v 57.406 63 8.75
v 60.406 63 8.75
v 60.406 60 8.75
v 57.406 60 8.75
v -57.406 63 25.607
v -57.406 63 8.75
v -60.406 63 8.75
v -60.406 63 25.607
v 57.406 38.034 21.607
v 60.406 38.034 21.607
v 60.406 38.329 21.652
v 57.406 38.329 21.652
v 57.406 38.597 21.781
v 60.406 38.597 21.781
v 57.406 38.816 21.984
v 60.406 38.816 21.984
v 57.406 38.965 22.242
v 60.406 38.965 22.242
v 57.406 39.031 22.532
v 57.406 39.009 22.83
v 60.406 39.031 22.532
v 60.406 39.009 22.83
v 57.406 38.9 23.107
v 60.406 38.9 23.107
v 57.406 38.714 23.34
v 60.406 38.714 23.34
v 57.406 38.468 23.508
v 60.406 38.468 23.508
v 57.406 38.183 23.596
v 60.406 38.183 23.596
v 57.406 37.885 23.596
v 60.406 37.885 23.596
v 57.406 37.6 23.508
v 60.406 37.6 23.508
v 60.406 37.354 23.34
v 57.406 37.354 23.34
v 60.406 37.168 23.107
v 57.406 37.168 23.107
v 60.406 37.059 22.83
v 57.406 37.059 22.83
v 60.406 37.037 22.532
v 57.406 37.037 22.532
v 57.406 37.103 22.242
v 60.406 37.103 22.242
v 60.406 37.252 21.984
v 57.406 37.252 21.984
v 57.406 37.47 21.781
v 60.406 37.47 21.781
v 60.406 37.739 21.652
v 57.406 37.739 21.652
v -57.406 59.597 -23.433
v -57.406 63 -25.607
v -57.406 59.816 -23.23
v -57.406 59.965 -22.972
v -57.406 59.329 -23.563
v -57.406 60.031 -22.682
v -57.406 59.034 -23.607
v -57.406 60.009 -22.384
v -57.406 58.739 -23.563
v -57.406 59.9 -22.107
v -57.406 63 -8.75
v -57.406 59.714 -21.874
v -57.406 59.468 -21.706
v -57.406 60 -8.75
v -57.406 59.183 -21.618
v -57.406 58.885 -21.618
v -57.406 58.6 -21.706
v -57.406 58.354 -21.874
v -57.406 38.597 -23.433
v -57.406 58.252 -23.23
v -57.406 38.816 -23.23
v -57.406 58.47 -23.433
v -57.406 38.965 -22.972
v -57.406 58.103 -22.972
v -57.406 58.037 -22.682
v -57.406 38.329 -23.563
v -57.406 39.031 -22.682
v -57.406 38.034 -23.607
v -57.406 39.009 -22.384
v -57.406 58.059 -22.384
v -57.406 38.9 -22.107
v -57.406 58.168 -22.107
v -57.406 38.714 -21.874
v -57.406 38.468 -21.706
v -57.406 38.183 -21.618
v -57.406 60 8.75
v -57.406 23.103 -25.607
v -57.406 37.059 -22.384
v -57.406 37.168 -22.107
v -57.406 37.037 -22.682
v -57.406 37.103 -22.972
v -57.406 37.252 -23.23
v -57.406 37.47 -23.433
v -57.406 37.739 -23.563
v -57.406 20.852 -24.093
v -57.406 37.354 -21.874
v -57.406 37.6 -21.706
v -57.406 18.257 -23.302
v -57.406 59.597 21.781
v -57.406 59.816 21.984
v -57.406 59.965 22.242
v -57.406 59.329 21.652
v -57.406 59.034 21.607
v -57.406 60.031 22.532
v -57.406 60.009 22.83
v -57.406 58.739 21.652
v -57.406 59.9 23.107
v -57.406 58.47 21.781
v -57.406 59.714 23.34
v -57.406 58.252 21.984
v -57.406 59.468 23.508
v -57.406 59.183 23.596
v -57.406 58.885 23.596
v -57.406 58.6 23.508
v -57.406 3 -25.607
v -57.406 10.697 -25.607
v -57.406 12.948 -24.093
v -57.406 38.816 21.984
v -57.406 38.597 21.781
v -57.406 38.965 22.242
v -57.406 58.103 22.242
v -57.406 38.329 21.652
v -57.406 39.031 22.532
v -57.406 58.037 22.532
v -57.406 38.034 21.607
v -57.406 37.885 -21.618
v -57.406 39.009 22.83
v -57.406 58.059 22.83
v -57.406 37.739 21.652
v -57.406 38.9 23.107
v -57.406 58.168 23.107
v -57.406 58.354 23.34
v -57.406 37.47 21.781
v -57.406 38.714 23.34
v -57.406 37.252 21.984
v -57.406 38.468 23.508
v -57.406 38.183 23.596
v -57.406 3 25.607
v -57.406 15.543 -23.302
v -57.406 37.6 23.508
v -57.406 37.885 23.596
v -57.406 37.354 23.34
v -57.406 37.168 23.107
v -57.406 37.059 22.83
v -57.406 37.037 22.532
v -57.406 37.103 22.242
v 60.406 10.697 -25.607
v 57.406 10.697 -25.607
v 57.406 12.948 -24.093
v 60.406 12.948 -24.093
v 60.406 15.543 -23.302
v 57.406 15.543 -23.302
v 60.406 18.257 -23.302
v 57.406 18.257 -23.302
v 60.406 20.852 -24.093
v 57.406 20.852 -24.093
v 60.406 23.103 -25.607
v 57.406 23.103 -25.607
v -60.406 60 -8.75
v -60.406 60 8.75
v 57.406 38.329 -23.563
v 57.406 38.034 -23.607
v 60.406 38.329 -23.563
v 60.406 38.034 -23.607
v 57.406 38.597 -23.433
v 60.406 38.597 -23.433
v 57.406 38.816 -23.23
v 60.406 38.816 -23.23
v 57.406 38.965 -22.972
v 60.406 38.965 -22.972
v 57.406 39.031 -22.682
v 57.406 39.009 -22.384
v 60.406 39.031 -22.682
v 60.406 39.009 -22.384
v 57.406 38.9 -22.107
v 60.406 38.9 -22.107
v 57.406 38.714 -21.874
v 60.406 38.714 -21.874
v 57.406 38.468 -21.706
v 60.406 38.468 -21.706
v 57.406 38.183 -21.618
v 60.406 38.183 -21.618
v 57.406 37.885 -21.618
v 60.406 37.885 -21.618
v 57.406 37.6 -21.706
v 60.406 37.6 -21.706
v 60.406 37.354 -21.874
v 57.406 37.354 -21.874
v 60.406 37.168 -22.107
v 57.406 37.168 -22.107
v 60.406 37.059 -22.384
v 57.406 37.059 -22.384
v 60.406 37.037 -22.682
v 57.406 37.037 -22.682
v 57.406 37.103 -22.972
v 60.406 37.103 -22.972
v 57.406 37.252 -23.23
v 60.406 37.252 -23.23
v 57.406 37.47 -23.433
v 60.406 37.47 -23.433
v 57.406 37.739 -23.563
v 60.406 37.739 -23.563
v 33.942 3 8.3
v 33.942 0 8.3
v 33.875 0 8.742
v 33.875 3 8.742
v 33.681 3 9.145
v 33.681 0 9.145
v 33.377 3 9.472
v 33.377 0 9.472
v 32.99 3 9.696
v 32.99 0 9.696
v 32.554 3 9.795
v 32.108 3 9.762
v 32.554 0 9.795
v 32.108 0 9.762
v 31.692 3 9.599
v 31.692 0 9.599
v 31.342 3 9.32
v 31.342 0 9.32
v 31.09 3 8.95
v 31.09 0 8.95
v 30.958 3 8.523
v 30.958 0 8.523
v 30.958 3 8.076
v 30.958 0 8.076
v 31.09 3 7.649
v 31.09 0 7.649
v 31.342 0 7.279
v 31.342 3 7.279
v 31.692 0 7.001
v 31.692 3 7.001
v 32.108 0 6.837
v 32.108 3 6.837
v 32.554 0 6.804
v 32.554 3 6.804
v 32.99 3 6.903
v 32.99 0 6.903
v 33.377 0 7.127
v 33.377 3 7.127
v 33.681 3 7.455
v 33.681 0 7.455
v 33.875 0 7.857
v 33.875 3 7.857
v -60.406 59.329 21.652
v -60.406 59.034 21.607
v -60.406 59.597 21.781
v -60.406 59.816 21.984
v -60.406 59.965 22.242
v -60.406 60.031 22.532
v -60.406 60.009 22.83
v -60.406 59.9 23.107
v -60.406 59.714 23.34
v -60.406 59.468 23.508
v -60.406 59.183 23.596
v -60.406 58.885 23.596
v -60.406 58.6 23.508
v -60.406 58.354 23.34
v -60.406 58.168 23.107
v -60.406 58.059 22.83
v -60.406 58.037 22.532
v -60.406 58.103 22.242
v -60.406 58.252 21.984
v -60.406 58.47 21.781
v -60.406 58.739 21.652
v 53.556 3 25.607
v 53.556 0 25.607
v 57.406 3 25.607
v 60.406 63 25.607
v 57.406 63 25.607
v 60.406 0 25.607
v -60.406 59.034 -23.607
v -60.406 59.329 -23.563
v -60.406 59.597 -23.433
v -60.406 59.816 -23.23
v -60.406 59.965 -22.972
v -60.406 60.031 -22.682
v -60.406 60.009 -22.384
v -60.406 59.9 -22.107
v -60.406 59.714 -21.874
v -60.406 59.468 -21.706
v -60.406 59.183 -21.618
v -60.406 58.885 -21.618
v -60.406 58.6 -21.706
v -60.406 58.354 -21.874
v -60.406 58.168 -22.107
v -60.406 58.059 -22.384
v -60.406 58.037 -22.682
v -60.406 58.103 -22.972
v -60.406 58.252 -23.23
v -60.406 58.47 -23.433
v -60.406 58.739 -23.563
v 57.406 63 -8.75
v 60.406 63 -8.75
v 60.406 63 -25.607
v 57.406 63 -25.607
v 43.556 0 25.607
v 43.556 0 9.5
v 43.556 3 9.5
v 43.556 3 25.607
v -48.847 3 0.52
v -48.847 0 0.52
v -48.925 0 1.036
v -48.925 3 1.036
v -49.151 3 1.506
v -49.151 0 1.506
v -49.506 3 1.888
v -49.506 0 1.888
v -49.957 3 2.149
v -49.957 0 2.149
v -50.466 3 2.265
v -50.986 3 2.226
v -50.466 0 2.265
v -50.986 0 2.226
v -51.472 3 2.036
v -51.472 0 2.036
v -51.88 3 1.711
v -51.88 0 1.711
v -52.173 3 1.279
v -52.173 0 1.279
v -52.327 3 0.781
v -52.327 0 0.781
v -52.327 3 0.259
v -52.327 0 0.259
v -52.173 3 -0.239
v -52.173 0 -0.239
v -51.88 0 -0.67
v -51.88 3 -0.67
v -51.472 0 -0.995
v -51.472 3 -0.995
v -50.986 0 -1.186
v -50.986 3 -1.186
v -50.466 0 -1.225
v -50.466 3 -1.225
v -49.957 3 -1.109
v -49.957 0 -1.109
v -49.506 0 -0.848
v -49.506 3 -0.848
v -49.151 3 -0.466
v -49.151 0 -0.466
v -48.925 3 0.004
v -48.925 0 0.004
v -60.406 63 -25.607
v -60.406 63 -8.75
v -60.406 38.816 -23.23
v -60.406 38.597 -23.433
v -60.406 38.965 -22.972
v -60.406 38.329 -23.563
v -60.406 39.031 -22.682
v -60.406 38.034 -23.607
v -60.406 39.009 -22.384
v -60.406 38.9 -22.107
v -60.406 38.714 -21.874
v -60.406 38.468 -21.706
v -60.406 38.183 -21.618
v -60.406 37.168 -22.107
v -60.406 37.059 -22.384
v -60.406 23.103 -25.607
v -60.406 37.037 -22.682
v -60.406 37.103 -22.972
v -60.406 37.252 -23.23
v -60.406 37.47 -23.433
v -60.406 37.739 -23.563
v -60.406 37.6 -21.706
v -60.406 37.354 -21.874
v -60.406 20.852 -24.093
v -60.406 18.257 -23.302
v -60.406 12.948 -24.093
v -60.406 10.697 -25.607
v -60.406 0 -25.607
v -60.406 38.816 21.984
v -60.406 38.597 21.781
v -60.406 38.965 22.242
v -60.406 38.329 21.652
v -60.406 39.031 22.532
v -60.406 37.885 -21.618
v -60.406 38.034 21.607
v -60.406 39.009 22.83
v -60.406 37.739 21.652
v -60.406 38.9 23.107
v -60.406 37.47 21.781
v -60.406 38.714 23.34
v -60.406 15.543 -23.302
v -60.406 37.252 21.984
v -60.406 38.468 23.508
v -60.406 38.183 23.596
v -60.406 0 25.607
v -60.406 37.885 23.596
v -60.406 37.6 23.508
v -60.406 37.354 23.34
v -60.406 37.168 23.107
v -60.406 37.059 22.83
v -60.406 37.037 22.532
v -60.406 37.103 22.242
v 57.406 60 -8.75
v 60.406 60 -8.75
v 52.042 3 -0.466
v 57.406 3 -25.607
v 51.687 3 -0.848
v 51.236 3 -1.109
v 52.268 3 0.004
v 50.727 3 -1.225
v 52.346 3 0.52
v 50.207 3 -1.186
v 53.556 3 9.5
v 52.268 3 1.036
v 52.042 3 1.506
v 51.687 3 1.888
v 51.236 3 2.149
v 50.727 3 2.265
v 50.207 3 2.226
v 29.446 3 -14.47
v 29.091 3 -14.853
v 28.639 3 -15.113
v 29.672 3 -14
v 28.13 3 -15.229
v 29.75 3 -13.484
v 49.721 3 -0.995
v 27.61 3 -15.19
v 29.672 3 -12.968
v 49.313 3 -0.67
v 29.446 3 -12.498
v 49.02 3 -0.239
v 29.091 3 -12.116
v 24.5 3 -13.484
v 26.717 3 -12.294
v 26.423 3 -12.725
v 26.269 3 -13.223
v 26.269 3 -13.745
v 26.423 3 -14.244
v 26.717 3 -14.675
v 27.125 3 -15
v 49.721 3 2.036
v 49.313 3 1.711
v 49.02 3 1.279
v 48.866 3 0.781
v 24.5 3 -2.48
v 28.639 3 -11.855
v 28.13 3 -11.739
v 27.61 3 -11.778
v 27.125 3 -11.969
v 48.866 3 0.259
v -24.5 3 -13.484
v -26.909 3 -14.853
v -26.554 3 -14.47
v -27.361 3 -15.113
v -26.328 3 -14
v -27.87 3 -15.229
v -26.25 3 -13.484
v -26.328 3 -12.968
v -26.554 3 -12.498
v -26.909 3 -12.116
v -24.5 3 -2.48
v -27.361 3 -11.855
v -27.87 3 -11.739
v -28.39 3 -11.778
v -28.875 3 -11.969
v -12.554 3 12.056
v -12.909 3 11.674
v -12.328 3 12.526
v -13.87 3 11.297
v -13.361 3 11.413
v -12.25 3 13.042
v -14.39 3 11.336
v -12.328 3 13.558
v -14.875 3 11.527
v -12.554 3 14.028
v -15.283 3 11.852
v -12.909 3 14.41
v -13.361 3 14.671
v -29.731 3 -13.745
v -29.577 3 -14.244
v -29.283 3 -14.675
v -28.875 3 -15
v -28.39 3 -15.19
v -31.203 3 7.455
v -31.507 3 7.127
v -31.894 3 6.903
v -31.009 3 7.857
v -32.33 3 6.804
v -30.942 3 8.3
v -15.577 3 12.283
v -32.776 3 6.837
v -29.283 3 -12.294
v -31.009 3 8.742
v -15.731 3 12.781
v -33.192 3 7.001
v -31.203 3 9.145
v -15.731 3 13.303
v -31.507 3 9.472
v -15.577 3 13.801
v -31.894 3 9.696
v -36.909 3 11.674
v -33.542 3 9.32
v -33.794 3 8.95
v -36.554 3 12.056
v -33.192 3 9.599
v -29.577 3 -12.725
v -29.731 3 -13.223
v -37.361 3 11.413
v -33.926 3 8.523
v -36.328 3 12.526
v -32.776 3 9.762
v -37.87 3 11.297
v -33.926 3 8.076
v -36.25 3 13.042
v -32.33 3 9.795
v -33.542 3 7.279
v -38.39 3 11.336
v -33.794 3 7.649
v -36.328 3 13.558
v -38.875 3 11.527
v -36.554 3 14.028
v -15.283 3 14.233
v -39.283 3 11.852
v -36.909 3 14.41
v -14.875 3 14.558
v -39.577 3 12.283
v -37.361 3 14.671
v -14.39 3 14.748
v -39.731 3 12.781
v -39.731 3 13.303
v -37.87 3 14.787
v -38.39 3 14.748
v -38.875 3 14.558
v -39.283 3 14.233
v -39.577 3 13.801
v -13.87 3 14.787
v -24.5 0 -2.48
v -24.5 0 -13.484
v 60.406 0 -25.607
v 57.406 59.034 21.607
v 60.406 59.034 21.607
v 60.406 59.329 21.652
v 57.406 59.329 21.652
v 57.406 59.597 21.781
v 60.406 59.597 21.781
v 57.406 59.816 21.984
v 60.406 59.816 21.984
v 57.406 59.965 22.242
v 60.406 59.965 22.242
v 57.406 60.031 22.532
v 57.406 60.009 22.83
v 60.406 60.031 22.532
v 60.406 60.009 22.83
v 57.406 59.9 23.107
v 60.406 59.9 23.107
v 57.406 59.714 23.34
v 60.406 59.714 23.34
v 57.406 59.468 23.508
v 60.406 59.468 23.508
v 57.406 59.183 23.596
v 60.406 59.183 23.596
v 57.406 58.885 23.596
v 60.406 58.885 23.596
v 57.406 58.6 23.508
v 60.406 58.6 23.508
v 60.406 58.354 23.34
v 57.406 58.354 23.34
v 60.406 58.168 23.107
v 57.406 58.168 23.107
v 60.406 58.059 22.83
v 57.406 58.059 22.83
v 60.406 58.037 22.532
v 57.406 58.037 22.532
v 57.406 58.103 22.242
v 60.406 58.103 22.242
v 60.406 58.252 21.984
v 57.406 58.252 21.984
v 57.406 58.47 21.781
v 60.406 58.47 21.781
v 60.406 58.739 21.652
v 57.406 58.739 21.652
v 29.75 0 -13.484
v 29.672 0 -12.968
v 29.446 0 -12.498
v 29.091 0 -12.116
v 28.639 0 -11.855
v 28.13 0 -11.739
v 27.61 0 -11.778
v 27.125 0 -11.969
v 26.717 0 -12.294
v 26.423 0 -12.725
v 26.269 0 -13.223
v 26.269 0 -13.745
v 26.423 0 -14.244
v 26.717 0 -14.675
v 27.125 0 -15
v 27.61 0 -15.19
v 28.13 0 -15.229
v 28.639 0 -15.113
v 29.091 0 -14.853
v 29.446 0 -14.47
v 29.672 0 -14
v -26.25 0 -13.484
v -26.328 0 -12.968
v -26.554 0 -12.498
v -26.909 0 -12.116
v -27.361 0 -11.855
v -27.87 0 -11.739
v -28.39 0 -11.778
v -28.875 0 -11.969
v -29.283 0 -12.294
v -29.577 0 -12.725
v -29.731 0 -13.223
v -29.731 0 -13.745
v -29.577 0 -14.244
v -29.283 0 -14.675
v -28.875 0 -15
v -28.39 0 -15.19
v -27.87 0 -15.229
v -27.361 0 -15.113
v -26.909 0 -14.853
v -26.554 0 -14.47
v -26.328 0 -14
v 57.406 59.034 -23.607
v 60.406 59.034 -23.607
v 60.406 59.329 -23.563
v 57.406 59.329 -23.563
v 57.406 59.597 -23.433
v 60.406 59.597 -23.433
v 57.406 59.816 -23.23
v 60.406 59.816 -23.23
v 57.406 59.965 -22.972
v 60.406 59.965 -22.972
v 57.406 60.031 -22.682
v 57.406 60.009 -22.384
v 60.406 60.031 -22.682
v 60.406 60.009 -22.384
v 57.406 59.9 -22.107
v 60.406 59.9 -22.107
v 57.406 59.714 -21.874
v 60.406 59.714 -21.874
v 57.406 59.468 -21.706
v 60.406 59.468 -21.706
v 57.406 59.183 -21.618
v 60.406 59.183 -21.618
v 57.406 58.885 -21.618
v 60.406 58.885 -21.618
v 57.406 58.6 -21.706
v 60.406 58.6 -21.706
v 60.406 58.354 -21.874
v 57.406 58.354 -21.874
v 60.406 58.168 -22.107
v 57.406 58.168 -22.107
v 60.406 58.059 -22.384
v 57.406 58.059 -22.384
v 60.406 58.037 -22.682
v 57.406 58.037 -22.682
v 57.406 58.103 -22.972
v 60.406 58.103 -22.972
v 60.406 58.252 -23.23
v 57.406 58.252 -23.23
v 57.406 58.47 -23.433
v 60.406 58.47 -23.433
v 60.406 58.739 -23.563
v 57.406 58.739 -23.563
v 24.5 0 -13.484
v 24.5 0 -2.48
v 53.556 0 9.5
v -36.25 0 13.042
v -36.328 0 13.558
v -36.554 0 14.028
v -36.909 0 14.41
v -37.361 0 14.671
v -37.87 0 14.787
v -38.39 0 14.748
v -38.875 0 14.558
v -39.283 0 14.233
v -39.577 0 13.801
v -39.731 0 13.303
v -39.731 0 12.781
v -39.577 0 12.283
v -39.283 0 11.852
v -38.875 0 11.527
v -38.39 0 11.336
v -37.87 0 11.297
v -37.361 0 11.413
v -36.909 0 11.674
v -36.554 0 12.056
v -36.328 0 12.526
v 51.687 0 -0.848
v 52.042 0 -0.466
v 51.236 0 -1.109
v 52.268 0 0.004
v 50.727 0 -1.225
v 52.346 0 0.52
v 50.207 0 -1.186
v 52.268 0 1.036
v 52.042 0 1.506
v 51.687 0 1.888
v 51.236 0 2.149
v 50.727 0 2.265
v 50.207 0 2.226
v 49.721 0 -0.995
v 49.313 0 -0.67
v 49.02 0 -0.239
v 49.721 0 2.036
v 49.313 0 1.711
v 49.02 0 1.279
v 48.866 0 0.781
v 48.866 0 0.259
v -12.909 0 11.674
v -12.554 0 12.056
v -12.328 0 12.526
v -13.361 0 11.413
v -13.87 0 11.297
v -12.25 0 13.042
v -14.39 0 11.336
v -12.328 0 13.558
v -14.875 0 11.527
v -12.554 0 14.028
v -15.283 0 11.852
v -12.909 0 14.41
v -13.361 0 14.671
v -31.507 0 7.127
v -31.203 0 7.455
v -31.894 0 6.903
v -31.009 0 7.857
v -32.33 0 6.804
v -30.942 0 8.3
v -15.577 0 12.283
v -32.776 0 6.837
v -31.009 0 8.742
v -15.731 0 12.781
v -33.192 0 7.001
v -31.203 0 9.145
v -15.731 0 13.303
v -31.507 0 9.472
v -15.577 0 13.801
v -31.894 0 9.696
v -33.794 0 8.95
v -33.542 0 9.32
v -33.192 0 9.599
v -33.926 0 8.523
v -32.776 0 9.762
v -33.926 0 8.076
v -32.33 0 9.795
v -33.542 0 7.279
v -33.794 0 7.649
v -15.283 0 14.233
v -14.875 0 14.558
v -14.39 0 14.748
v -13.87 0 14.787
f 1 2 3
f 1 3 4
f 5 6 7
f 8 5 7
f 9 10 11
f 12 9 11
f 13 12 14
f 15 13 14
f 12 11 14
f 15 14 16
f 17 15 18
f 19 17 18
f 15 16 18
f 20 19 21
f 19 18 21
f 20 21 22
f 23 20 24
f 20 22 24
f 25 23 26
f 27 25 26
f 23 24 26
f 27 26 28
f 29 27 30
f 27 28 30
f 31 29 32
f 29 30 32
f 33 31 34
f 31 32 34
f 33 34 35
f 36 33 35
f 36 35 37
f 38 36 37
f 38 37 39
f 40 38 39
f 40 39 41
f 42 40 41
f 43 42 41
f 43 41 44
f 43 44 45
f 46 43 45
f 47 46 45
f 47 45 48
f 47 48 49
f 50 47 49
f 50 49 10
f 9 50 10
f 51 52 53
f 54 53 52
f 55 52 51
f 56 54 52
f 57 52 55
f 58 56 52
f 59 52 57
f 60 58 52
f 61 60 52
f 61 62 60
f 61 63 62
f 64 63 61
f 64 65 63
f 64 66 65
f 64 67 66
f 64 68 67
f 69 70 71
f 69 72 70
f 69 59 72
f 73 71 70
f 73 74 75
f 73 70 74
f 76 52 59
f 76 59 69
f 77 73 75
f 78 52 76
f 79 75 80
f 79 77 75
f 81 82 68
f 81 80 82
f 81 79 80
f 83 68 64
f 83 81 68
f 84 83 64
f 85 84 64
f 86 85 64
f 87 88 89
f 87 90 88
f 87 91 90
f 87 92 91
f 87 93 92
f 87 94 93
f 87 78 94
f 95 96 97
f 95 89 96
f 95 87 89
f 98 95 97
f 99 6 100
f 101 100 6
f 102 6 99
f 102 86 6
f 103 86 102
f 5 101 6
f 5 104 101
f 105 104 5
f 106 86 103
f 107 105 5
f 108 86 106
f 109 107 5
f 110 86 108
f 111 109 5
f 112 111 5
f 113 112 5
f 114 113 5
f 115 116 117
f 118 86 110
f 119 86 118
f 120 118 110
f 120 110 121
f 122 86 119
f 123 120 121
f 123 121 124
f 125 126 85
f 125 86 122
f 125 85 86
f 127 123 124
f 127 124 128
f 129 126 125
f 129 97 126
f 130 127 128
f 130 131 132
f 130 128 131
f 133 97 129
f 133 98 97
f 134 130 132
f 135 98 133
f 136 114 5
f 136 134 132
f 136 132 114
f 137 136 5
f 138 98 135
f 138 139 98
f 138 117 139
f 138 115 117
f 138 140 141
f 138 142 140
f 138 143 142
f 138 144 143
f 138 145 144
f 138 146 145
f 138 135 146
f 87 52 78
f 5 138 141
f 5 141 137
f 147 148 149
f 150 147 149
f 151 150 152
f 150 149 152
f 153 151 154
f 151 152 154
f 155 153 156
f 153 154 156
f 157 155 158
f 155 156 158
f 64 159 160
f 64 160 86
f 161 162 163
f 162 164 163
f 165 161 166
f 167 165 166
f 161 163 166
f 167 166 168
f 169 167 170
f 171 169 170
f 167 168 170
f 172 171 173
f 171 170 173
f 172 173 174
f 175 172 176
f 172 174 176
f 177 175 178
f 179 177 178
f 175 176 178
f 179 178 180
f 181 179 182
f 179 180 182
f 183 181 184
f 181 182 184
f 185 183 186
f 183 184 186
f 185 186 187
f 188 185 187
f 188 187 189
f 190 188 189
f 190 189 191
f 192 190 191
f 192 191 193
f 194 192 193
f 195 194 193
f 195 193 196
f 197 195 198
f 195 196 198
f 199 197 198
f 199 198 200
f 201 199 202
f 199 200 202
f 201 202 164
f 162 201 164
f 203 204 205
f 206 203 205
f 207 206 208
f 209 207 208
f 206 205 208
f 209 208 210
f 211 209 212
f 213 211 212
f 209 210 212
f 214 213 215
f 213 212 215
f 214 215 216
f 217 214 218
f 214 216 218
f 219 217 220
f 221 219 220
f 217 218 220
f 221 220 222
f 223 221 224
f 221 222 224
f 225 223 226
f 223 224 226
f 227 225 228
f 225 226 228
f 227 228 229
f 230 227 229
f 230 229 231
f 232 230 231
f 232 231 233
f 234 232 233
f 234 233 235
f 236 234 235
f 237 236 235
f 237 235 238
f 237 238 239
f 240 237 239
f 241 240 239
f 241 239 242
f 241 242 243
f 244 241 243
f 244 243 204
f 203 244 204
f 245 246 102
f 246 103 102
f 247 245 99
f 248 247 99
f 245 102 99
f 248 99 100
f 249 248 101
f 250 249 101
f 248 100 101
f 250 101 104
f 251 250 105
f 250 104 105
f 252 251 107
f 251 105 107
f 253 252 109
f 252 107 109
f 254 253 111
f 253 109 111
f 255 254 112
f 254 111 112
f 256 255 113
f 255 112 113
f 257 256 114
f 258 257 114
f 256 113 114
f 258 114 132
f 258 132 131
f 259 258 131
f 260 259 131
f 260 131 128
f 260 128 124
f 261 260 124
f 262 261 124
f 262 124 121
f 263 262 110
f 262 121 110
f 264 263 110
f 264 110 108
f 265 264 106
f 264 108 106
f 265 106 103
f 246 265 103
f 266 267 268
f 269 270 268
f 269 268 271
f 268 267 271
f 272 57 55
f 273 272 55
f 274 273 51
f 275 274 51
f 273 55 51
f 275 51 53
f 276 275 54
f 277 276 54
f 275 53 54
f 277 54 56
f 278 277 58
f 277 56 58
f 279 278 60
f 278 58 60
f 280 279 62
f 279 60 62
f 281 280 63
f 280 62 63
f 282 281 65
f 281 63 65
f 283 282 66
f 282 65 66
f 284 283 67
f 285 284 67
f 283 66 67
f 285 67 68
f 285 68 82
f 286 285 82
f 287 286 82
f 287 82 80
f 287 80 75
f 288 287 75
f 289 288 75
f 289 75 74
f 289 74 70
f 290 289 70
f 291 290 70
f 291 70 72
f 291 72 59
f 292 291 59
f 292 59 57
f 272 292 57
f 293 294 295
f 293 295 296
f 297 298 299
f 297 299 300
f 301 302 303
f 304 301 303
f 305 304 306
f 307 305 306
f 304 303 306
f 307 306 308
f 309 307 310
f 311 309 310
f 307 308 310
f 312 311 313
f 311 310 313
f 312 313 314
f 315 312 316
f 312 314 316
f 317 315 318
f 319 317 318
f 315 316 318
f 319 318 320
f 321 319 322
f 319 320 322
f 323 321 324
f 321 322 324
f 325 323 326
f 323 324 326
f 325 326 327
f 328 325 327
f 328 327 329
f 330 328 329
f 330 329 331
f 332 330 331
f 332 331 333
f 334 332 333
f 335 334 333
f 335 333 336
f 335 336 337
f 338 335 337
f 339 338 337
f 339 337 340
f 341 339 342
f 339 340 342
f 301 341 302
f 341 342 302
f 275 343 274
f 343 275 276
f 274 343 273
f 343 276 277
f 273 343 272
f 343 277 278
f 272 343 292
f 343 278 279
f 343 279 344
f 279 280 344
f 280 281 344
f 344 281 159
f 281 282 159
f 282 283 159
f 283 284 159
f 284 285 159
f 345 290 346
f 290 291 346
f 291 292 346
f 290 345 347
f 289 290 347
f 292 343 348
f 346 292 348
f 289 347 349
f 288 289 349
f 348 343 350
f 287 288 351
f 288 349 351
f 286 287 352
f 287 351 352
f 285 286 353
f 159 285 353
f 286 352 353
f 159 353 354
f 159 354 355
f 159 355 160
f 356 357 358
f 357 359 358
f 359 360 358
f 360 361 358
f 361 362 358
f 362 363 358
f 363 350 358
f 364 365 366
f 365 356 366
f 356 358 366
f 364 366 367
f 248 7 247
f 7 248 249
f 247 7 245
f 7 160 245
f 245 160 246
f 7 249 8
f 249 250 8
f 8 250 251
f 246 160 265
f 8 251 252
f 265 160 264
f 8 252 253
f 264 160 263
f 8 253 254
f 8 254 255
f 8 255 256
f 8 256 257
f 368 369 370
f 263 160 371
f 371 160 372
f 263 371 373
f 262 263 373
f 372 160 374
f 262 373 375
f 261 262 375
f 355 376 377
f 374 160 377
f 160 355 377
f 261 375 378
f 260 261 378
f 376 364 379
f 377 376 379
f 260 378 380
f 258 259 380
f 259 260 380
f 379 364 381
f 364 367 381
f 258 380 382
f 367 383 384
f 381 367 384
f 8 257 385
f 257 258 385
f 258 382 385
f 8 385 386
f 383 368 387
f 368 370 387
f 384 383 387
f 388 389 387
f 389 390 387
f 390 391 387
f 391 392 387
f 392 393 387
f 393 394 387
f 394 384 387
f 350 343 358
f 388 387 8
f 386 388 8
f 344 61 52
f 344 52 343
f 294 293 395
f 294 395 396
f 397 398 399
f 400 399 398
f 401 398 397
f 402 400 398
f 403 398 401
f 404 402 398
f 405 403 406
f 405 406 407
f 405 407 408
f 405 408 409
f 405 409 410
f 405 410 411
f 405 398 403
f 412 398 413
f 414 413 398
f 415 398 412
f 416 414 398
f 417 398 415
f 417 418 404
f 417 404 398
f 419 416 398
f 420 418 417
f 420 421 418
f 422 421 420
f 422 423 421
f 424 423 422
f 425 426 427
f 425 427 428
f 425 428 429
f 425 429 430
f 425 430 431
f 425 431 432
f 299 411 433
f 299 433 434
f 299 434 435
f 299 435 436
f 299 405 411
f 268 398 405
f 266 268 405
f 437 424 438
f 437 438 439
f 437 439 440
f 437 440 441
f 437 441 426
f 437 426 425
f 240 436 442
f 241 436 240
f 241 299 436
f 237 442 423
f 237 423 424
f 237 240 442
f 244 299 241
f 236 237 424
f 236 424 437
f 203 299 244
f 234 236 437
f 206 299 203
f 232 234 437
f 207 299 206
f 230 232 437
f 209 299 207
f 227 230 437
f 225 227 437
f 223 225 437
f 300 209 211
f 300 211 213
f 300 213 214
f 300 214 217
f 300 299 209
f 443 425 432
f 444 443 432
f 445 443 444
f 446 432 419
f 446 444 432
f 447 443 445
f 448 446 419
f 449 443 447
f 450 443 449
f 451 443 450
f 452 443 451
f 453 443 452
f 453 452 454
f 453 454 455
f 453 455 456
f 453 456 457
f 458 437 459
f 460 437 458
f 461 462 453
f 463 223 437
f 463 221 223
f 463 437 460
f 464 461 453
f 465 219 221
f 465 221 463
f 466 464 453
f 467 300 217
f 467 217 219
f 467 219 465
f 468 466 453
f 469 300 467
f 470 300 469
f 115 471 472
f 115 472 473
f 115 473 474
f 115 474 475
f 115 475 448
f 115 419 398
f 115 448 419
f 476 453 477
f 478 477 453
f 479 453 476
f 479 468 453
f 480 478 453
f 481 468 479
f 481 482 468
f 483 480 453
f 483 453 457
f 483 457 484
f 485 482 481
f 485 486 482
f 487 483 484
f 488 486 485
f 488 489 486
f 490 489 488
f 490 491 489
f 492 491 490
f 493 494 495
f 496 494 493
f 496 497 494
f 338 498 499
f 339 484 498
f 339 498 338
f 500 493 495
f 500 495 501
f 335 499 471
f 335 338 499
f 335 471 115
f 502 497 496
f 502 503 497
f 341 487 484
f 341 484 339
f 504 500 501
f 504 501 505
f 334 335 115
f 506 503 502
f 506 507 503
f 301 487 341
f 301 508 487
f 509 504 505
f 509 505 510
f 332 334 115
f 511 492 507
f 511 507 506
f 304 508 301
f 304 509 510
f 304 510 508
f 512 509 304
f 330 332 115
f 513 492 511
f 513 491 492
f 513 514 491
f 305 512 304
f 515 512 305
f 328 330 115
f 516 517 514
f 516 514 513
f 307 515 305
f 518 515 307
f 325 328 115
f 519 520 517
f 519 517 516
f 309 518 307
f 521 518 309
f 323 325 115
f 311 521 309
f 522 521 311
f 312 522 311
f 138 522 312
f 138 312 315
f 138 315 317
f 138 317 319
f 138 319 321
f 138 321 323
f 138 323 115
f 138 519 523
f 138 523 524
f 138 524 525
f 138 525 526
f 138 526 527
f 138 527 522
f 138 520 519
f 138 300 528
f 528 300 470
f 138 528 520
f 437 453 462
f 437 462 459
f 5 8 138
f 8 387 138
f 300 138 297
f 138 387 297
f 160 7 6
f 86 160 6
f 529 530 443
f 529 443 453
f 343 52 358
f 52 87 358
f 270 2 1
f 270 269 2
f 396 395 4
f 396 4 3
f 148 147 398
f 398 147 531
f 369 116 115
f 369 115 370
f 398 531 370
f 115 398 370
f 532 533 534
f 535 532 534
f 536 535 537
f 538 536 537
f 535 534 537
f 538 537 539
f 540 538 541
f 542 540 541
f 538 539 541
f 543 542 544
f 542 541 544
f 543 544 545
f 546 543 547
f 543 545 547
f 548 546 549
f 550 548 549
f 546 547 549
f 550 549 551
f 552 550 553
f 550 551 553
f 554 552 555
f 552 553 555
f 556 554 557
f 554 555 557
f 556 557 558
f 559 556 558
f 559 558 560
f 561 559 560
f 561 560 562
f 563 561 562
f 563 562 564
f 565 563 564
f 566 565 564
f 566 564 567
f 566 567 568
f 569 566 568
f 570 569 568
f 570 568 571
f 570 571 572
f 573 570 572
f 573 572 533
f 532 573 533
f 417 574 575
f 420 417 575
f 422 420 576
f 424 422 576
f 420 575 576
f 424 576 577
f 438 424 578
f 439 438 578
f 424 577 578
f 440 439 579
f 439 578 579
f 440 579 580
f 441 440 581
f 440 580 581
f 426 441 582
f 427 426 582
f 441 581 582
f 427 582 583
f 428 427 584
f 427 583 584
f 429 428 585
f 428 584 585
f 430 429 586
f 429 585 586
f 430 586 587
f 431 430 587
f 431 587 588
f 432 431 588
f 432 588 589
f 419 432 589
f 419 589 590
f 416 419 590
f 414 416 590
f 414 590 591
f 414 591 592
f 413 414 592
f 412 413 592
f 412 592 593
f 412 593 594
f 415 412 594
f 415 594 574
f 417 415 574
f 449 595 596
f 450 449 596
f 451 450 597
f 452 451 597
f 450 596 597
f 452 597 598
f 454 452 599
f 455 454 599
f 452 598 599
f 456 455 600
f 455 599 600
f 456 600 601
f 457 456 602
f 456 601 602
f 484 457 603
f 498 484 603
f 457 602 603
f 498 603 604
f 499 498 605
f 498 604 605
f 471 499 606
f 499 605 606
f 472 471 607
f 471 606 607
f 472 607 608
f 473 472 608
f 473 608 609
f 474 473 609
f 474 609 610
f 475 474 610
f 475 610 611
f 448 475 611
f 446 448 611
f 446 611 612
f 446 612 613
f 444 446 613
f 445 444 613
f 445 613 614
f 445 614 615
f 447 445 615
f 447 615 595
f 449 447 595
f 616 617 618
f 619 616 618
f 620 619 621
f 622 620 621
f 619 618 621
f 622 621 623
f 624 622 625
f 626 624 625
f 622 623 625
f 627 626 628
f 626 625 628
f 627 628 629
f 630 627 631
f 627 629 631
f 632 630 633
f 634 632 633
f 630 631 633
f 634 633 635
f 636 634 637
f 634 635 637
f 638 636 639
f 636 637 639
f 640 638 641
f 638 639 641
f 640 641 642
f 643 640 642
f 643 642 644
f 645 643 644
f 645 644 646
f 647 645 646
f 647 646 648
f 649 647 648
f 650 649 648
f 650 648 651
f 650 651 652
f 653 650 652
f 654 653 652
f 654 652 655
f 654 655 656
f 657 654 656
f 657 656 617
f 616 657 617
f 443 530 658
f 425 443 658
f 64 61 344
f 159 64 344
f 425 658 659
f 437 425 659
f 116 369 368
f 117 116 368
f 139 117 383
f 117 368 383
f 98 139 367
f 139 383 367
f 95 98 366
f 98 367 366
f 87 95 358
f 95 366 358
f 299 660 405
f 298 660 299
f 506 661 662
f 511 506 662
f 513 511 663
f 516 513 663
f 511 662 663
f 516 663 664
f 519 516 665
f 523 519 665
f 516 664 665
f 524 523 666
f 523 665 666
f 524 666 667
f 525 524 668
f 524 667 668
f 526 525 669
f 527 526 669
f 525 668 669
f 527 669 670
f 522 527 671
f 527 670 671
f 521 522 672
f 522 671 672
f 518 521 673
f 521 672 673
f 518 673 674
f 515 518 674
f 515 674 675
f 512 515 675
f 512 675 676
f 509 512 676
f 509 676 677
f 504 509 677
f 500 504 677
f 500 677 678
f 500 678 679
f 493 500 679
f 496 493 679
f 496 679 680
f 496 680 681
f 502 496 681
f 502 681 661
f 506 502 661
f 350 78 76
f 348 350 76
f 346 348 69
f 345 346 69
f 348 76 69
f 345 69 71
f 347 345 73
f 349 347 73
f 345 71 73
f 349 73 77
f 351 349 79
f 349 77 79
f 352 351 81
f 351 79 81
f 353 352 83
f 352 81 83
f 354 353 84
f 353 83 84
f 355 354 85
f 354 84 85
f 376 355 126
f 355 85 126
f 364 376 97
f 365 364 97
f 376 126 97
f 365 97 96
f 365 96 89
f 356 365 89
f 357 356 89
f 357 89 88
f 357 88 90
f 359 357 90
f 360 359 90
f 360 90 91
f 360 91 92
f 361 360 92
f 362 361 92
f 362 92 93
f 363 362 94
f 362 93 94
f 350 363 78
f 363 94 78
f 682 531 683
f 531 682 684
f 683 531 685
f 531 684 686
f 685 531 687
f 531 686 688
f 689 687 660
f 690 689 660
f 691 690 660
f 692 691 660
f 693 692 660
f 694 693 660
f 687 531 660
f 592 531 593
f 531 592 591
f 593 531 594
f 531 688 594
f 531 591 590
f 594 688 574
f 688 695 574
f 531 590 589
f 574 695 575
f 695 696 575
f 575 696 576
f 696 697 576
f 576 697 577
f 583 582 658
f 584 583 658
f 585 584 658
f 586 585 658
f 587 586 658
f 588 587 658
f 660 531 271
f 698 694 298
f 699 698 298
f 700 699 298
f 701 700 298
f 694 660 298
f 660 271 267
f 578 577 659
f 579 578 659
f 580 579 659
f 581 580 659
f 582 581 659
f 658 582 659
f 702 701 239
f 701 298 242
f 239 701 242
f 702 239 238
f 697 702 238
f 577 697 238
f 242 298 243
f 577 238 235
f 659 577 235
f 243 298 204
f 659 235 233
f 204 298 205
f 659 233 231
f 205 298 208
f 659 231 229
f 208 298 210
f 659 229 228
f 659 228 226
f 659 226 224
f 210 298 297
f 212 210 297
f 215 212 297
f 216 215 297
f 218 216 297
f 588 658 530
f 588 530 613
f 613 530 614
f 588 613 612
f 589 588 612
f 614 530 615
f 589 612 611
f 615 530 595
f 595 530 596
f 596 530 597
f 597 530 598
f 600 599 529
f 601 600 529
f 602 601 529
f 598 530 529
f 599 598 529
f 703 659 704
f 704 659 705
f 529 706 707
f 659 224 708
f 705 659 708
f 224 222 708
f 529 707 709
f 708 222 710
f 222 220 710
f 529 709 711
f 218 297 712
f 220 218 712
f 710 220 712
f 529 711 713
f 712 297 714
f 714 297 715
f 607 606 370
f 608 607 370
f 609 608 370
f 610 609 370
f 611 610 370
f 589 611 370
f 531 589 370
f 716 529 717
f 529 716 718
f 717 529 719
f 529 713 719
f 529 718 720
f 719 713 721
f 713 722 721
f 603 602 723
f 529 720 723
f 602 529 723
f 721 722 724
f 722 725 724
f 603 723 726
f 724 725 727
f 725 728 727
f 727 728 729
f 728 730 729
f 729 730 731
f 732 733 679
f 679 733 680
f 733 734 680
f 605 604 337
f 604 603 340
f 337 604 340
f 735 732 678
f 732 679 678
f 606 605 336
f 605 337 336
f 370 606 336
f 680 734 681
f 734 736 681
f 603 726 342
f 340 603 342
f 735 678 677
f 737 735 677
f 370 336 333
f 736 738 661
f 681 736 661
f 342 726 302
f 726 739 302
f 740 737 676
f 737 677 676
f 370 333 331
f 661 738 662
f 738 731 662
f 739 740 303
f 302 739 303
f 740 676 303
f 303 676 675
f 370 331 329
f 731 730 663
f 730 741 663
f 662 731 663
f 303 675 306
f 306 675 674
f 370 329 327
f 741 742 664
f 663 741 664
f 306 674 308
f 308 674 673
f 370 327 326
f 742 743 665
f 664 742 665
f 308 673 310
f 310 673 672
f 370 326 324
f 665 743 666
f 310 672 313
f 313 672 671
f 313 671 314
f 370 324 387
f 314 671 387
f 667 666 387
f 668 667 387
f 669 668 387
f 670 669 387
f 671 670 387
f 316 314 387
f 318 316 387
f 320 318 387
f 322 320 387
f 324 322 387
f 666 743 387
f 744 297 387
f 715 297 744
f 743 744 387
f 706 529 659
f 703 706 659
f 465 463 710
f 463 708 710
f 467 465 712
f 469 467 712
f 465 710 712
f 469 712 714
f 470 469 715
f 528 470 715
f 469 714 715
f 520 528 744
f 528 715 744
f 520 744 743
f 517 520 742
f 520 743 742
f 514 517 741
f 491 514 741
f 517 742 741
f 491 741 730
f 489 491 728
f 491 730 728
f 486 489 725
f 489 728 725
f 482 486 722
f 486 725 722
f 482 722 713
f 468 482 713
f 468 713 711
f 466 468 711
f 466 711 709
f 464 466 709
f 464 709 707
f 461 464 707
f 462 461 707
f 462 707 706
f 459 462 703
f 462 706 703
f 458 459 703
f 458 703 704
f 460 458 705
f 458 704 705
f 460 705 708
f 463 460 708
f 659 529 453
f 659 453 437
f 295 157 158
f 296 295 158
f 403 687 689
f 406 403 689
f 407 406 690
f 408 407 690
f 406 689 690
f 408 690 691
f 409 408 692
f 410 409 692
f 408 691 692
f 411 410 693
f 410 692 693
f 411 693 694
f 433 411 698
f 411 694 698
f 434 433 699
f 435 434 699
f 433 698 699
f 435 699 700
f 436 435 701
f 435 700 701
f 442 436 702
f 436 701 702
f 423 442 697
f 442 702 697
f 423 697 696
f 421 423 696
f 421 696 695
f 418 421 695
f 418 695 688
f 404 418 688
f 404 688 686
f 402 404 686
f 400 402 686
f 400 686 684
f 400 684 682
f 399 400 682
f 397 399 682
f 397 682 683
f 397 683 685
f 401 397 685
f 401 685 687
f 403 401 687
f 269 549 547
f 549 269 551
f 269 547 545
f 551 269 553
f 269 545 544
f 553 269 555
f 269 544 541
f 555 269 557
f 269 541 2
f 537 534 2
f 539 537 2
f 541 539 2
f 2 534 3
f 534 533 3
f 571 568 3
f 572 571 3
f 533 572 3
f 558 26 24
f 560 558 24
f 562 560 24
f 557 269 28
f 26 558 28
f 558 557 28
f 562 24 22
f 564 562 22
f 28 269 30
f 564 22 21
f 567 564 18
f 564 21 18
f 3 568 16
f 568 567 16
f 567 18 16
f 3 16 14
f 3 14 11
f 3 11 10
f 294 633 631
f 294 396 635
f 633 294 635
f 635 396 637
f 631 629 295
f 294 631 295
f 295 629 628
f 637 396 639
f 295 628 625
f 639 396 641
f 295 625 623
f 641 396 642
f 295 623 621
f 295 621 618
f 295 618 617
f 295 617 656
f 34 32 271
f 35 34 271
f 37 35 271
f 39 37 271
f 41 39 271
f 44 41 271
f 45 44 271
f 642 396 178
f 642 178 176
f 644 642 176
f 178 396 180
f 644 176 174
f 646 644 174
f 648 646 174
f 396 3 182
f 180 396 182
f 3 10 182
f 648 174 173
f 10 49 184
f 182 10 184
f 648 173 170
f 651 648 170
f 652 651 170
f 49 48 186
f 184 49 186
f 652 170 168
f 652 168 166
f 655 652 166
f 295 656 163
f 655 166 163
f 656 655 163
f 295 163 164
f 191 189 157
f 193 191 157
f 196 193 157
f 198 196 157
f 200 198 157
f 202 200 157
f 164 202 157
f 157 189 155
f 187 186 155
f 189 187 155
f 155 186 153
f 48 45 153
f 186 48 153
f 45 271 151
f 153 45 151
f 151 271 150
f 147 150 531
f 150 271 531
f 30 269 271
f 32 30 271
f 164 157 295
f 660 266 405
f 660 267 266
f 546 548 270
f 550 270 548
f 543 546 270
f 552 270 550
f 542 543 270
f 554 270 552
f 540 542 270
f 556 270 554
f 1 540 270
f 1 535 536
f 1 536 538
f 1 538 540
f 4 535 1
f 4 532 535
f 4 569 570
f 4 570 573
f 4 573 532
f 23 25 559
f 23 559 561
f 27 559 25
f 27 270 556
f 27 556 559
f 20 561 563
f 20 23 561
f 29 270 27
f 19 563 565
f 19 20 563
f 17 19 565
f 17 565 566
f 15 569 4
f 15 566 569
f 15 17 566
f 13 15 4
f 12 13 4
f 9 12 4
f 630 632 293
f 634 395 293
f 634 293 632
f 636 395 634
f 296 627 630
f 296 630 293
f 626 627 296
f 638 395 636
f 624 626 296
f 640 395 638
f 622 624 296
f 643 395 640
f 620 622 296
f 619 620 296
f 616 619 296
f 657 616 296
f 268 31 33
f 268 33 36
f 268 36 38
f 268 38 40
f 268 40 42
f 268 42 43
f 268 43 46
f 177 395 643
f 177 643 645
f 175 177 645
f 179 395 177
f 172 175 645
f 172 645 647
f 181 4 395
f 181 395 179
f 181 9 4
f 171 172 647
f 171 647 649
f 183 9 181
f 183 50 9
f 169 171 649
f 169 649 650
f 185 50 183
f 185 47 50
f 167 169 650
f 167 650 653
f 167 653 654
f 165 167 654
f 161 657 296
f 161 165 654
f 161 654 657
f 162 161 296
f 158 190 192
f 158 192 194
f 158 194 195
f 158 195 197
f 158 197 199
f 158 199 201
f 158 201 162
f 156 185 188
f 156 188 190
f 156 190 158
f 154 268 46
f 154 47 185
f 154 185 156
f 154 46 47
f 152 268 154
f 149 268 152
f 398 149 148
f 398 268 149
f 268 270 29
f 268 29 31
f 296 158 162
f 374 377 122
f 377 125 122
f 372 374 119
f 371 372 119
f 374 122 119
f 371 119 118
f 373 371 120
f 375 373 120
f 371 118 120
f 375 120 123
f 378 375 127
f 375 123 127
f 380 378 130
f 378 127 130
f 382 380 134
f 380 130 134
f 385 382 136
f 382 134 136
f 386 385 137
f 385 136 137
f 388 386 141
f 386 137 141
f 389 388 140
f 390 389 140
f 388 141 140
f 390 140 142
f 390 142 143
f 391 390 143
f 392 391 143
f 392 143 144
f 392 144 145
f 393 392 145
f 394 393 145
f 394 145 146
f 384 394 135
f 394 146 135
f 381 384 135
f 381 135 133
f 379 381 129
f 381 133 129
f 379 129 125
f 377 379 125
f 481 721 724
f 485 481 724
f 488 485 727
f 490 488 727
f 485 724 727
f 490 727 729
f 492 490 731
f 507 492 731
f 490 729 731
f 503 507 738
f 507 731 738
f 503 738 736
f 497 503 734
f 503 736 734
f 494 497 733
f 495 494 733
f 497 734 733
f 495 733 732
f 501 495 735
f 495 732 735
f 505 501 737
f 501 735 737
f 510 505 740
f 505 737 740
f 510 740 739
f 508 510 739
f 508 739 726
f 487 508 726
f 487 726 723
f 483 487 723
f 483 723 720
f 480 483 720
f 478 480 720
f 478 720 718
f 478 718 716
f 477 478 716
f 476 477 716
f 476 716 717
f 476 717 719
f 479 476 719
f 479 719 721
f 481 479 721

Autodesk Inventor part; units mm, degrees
ref_plane "YZ Plane" through (0, 0, 0) normal (1, 0, 0) x (0, 1, 0)
ref_plane "XZ Plane" through (0, 0, 0) normal (0, 1, 0) x (-1, 0, 0)
sketch "Sketch1" plane through (0, 0, 0) normal (0, 1, 0) x (-1, 0, 0)
  line L0 (60.406, 25.6071) -> (-60.406, 25.6071)
  line L1 (-60.406, 25.6071) -> (-60.406, -25.6071)
  line L2 (-60.406, -25.6071) -> (60.406, -25.6071)
  line L3 (60.406, -25.6071) -> (60.406, 25.6071)
  line L4 (60.406, 25.6071) -> (-60.406, -25.6071) construction
  line L5 (-60.406, 25.6071) -> (60.406, -25.6071) construction
  line L6 (-57.406, 25.6071) -> (-57.406, -25.6071)
  line L7 (57.406, -25.6071) -> (57.406, 25.6071)
  line L8 (57.406, 23.5058) -> (55.4493, 23.5058)
  line L9 (-55.4493, 23.5058) -> (-57.406, 23.5058)
  line L10 (-57.406, -33.4947) -> (-79.0126, -33.4947)
  line L11 (79.0126, -33.4947) -> (57.406, -33.4947)
  point P0 (0, 0)
  dimension "d0" = 120.812
  dimension "d1" = 51.2141
  dimension "d8" = 3
  dimension "d9" = 3
  dimension "d10" = 114.812
extrude "Extrusion1" add sketch "Sketch1" along normal blind 3
extrude "Extrusion2" add sketch "Sketch1" along normal blind 63 contours L3 L2 L7 L0 | L6 L2 L1 L0
ref_plane "Work Plane2" through (0, 0, -18.4174) normal (0, 0, 1) x (1, 0, 0)
sketch "Sketch2" plane through (0, 0, 0) normal (0, -1, 0) x (1, 0, 0)
  circle A0 centre (-50.5968, 0.5202) radius 1.75 projected
  circle A1 centre (-28.0003, -13.4843) radius 1.75 projected
  circle A2 centre (50.5962, 0.5202) radius 1.75 projected
  circle A3 centre (27.9997, -13.4843) radius 1.75 projected
  circle A4 centre (27.9997, -13.4843) radius 1.75
  circle A5 centre (50.5962, 0.5202) radius 1.75
  circle A6 centre (-28.0003, -13.4843) radius 1.75
  circle A7 centre (-50.5968, 0.5202) radius 1.75
  point P0 (0, 0)
  dimension "d12" = 3.5
  dimension "d13" = 3.5
  dimension "d14" = 3.5
  dimension "d15" = 3.5
extrude "Extrusion3" cut sketch "Sketch2" against normal up to next
sketch "Sketch4" plane through (0, 63, 0) normal (0, 1, 0) x (1, 0, 0)
  line L0 (-60.406, -8.75) -> (-56.906, -8.75)
  line L1 (-56.906, -8.75) -> (-56.906, 8.75)
  line L2 (-56.906, 8.75) -> (-60.406, 8.75)
  line L3 (-60.406, -8.75) -> (-60.406, 8.75)
  line L4 (0, 0) -> (0, 8.75)
  line L5 (60.406, -8.75) -> (56.906, -8.75)
  line L6 (56.906, -8.75) -> (56.906, 8.75)
  line L7 (56.906, 8.75) -> (60.406, 8.75)
  line L8 (60.406, -8.75) -> (60.406, 8.75)
  point P0 (-60.406, 0)
  point P1 (60.406, 0)
  dimension "d18" = 17.5
extrude "Extrusion4" cut sketch "Sketch4" against normal blind 3
sketch "Sketch6" plane through (0, 0, 0) normal (0, -1, 0) x (1, 0, 0)
  circle A0 centre (-32.4423, 8.2996) radius 1.5 projected
  circle A1 centre (32.4417, 8.2996) radius 1.5 projected
  point P0 (0, 0)
extrude "Extrusion5" cut sketch "Sketch6" against normal up to next
sketch "Sketch9" plane through (60.406, 0, 25.6071) normal (1, 0, 0) x (0, 0, -1)
  circle A0 centre (3, 59.0338) radius 1 projected
  circle A1 centre (3, 38.0338) radius 1 projected
  circle A2 centre (48.2141, 59.0338) radius 1 projected
  circle A3 centre (48.2141, 38.0338) radius 1 projected
  point P0 (25.6071, 0)
extrude "Extrusion7" cut sketch "Sketch9" against normal blind 200
sketch "Sketch10" plane through (0, 0, 0) normal (0, -1, 0) x (1, 0, 0)
  circle A0 centre (-28.0003, -13.4843) radius 1.75 projected
  circle A1 centre (27.9997, -13.4843) radius 1.75 projected
  line L0 (53.5962, 73.5112) -> (-53.5968, 73.5112)
  line L1 (-24.5003, -13.4843) -> (24.4997, -13.4843)
  line L2 (24.4997, 73.5112) -> (-24.5003, 73.5112)
  line L3 (-24.5003, -13.4843) -> (-24.5003, -2.4798)
  line L4 (-24.5003, -13.4843) -> (-13.4958, -13.4843) construction
  line L5 (-24.5003, -2.4798) -> (24.4997, -2.4798)
  line L6 (24.4997, -13.4843) -> (24.4997, -2.4798)
  point P0 (0, 0)
  dimension "d39" = 90
extrude "Extrusion8" cut sketch "Sketch10" against normal up to next contours L3 L5 L6 L1
sketch "Sketch11" plane through (0, 0, 0) normal (0, -1, 0) x (1, 0, 0)
  circle A0 centre (-38.0003, 13.0422) radius 1.75
  circle A1 centre (-14.0003, 13.0422) radius 1.75
  line L0 (-36.0003, -4.4688) -> (-36.0003, 50.5312) projected
  line L1 (-16.0003, 50.5312) -> (-16.0003, -4.4688) projected
  line L2 (-34.6078, 15.0422) -> (34.6072, 15.0422) projected
  point P0 (0, 0)
  dimension "d31" = 3.5
  dimension "d32" = 3.5
  dimension "d33" = 2
  dimension "d34" = 2
  dimension "d37" = 2
  dimension "d38" = 2
extrude "Extrusion9" cut sketch "Sketch11" against normal up to next
sketch "Sketch15" plane through (-60.406, 0, -25.6071) normal (-1, 0, 0) x (0, 0, 1)
  circle A0 centre (-6.7939, 16.9) radius 9.2 projected
  point P0 (25.6071, 0)
extrude "Extrusion11" cut sketch "Sketch15" against normal through all
sketch "Sketch16" plane through (0, 0, 0) normal (0, -1, 0) x (1, 0, 0)
  line L0 (45.6757, 24.585) -> (45.6757, 11.915) projected
  line L1 (51.4357, 11.915) -> (51.4357, 24.585) projected
  line L2 (45.6757, 11.915) -> (51.4357, 11.915) projected
  line L3 (51.4357, 24.585) -> (45.6757, 24.585) projected
  line L4 (43.5557, 27) -> (53.5557, 27)
  line L5 (53.5557, 27) -> (53.5557, 9.5)
  line L6 (53.5557, 9.5) -> (43.5557, 9.5)
  line L7 (43.5557, 9.5) -> (43.5557, 27)
  line L8 (43.5557, 27) -> (53.5557, 9.5) construction
  line L9 (53.5557, 27) -> (43.5557, 9.5) construction
  point P0 (0, 0)
  point P1 (48.5557, 18.25)
  dimension "d49" = 10
  dimension "d50" = 17.5
extrude "Extrusion12" cut sketch "Sketch16" against normal up to next contours L3 L1 L2 L0 | L4 L5 L6 L7
properties part number "Kepala Tengah"
